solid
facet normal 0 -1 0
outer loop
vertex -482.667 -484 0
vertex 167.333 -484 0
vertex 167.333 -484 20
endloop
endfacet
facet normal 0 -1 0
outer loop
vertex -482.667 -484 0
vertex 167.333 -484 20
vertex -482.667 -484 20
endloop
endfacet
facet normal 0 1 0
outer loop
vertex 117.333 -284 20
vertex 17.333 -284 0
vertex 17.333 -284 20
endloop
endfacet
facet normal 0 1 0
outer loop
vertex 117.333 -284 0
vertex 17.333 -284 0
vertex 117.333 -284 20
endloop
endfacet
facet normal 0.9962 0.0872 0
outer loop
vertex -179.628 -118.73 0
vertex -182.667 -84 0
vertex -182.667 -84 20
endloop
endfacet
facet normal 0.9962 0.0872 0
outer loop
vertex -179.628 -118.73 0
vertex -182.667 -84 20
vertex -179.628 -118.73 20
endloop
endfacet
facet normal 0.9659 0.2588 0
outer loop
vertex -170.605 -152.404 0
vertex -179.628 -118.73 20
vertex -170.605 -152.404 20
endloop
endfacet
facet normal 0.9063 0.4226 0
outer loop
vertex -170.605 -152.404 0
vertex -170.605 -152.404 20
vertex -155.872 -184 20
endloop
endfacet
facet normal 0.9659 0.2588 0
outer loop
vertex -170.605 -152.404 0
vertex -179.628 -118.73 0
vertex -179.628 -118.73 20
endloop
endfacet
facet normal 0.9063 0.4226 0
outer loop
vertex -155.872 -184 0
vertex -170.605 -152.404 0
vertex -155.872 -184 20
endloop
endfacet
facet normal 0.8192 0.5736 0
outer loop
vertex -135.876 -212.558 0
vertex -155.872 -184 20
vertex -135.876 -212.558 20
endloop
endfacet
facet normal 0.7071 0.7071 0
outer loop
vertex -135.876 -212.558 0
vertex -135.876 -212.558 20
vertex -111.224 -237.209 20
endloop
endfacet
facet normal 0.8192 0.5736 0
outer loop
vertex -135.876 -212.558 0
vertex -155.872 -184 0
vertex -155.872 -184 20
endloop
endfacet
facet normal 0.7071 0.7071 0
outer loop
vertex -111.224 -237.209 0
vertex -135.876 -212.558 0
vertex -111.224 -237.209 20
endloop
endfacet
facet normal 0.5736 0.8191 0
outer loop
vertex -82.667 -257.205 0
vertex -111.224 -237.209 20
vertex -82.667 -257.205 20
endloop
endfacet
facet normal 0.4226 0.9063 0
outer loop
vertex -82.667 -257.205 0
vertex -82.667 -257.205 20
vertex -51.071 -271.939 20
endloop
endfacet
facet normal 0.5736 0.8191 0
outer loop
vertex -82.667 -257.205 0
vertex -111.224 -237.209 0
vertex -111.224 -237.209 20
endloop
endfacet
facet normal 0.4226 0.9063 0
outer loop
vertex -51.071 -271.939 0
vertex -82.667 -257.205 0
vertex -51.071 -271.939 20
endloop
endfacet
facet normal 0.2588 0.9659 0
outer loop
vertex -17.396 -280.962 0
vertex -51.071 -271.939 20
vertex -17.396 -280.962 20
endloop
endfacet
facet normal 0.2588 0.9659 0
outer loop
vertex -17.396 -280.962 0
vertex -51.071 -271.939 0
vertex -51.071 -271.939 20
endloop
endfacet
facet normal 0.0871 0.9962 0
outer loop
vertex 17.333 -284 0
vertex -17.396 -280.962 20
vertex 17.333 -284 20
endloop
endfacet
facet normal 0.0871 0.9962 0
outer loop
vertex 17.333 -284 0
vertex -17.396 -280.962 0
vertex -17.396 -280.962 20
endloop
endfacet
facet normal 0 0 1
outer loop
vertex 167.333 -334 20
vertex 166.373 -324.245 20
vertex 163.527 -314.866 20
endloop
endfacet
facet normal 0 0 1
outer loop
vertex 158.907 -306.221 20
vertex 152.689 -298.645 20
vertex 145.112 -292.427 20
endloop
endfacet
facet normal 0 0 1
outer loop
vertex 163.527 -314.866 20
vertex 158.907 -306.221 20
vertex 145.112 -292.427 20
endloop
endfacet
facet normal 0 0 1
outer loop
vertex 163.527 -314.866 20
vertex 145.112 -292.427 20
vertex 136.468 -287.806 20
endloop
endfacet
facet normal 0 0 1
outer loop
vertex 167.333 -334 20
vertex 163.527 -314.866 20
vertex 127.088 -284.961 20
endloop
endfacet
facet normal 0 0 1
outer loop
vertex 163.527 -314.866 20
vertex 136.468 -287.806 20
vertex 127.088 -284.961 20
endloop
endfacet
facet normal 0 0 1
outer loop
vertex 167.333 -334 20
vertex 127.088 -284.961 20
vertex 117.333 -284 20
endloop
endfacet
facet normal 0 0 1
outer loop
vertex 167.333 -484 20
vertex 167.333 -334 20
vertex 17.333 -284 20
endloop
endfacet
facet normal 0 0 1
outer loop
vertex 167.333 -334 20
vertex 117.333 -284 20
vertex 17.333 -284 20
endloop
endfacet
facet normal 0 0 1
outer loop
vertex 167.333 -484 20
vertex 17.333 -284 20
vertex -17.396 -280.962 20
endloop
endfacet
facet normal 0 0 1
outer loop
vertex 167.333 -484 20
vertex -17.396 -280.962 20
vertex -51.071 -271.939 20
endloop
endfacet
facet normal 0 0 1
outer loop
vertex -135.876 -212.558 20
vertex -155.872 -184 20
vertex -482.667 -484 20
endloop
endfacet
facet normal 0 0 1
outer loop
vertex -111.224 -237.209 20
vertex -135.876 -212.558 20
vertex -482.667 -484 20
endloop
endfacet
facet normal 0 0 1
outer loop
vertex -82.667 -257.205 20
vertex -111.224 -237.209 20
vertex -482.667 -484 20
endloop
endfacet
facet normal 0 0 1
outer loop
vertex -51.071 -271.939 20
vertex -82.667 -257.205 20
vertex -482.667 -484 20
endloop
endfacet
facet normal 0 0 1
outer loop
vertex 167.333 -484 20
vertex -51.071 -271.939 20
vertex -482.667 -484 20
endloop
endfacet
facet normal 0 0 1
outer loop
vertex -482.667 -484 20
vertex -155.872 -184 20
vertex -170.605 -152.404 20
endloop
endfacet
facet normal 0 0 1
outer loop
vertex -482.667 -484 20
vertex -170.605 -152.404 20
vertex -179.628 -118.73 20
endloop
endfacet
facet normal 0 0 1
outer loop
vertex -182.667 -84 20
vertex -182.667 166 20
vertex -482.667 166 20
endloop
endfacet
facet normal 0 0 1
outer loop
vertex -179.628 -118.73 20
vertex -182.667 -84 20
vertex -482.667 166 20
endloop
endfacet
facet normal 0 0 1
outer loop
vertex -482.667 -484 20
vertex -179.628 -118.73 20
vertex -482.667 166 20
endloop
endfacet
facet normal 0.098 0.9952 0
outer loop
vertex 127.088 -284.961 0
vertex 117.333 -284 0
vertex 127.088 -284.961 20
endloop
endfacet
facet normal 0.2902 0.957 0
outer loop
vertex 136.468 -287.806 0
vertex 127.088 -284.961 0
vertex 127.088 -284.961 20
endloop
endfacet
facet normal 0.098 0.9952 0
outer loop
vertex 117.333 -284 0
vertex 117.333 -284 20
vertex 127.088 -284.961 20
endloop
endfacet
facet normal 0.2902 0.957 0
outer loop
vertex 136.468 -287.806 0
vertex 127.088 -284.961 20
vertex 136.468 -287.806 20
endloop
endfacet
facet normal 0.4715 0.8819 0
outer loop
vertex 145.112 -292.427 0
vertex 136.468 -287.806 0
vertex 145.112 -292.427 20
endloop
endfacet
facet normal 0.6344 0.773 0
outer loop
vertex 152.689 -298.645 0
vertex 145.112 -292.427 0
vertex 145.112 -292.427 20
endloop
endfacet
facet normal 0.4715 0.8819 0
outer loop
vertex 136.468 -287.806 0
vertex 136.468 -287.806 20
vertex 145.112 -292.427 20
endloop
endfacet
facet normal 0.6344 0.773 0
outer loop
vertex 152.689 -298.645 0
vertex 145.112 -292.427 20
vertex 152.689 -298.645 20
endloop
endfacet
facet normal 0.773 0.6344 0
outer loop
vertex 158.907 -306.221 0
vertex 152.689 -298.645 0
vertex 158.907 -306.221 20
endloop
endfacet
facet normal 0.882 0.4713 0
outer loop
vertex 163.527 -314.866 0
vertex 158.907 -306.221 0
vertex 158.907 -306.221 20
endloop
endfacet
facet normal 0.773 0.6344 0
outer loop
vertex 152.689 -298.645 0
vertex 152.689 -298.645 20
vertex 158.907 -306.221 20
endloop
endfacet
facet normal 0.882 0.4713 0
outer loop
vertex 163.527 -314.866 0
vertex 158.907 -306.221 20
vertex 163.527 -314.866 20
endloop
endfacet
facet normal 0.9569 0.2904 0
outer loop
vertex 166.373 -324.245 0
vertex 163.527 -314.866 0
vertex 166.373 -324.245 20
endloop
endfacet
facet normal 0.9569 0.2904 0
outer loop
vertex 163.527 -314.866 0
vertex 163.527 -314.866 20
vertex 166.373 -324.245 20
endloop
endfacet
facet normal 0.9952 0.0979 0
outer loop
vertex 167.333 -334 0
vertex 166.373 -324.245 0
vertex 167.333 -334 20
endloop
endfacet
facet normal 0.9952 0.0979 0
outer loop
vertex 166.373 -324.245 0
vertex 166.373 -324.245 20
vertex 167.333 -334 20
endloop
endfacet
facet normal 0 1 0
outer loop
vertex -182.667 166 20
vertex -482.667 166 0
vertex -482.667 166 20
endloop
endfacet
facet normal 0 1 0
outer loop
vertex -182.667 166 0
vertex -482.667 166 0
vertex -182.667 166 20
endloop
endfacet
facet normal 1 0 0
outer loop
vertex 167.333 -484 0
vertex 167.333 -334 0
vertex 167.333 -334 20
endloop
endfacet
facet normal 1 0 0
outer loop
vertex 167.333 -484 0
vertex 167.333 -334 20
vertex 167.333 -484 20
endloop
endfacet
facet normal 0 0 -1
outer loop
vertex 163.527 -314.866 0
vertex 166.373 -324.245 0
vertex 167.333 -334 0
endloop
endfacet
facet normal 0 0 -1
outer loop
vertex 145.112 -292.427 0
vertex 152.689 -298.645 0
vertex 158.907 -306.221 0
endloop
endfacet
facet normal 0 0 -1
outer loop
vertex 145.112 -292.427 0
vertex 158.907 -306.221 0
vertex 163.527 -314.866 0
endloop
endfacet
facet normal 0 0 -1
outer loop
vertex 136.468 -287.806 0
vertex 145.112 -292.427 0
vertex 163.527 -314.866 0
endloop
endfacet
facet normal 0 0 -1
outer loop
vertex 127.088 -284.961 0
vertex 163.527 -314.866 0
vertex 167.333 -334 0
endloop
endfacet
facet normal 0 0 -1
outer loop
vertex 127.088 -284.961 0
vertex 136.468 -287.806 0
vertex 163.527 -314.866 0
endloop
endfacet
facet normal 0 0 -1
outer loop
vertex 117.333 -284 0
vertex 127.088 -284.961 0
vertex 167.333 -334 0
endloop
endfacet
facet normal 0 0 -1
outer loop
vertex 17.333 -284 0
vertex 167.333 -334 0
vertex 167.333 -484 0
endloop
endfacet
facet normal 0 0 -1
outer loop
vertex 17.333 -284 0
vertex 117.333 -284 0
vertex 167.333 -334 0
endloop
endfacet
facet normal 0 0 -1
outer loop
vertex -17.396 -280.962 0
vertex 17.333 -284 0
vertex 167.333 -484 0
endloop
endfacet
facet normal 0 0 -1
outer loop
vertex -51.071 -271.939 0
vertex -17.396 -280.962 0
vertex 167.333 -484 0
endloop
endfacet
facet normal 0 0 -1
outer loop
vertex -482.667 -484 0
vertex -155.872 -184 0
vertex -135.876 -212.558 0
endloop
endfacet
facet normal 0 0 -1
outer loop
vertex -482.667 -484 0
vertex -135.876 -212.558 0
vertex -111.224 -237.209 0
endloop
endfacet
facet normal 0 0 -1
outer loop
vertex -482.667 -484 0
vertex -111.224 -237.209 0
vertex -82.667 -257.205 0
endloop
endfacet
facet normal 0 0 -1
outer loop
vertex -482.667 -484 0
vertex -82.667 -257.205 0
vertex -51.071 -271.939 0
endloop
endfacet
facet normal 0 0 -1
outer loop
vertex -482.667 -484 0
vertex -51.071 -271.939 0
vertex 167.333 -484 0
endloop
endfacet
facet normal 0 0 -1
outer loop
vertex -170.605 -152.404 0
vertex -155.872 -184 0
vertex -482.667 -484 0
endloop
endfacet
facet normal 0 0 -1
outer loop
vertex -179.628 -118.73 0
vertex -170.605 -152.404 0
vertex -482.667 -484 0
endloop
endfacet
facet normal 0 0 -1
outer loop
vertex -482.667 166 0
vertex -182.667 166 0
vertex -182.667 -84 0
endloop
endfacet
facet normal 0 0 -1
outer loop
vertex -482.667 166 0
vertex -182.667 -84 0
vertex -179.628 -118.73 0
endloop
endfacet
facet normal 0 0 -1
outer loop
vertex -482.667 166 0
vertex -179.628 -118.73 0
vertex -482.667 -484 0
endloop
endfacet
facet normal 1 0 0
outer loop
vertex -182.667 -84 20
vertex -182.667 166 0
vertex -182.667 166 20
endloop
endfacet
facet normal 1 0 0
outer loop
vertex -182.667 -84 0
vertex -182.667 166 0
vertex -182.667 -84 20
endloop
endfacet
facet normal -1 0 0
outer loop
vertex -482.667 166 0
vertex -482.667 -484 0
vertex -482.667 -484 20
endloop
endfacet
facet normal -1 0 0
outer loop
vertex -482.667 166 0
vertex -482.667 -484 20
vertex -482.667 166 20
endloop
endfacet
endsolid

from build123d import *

# Parameters (mm, degrees)
BOSS_EXTRUDE1_DEPTH = 20
FILLET1_R           = 50


with BuildPart() as part:
    # Sketch1 → Boss-Extrude1 (new body)
    with BuildSketch(Plane.XY):
        with BuildLine():
            Line((-482.666666667, 166), (-182.666666667, 166))
            Line((-182.666666667, 166), (-182.666666667, -84))
            ThreePointArc((-182.666666667, -84), (-124.088022904, -225.421356237), (17.333333333, -284))
            Line((17.333333333, -284), (167.333333333, -284))
            Line((167.333333333, -284), (167.333333333, -484))
            Line((167.333333333, -484), (-482.666666667, -484))
            Line((-482.666666667, -484), (-482.666666667, 166))
        make_face()
    extrude(amount=BOSS_EXTRUDE1_DEPTH)

    # Fillet1
    fillet1_edges = [part.edges().sort_by_distance(p)[0] for p in [
        (167.333333333, -284, 10),
    ]]
    fillet(fillet1_edges, radius=FILLET1_R)


solid = part.part
